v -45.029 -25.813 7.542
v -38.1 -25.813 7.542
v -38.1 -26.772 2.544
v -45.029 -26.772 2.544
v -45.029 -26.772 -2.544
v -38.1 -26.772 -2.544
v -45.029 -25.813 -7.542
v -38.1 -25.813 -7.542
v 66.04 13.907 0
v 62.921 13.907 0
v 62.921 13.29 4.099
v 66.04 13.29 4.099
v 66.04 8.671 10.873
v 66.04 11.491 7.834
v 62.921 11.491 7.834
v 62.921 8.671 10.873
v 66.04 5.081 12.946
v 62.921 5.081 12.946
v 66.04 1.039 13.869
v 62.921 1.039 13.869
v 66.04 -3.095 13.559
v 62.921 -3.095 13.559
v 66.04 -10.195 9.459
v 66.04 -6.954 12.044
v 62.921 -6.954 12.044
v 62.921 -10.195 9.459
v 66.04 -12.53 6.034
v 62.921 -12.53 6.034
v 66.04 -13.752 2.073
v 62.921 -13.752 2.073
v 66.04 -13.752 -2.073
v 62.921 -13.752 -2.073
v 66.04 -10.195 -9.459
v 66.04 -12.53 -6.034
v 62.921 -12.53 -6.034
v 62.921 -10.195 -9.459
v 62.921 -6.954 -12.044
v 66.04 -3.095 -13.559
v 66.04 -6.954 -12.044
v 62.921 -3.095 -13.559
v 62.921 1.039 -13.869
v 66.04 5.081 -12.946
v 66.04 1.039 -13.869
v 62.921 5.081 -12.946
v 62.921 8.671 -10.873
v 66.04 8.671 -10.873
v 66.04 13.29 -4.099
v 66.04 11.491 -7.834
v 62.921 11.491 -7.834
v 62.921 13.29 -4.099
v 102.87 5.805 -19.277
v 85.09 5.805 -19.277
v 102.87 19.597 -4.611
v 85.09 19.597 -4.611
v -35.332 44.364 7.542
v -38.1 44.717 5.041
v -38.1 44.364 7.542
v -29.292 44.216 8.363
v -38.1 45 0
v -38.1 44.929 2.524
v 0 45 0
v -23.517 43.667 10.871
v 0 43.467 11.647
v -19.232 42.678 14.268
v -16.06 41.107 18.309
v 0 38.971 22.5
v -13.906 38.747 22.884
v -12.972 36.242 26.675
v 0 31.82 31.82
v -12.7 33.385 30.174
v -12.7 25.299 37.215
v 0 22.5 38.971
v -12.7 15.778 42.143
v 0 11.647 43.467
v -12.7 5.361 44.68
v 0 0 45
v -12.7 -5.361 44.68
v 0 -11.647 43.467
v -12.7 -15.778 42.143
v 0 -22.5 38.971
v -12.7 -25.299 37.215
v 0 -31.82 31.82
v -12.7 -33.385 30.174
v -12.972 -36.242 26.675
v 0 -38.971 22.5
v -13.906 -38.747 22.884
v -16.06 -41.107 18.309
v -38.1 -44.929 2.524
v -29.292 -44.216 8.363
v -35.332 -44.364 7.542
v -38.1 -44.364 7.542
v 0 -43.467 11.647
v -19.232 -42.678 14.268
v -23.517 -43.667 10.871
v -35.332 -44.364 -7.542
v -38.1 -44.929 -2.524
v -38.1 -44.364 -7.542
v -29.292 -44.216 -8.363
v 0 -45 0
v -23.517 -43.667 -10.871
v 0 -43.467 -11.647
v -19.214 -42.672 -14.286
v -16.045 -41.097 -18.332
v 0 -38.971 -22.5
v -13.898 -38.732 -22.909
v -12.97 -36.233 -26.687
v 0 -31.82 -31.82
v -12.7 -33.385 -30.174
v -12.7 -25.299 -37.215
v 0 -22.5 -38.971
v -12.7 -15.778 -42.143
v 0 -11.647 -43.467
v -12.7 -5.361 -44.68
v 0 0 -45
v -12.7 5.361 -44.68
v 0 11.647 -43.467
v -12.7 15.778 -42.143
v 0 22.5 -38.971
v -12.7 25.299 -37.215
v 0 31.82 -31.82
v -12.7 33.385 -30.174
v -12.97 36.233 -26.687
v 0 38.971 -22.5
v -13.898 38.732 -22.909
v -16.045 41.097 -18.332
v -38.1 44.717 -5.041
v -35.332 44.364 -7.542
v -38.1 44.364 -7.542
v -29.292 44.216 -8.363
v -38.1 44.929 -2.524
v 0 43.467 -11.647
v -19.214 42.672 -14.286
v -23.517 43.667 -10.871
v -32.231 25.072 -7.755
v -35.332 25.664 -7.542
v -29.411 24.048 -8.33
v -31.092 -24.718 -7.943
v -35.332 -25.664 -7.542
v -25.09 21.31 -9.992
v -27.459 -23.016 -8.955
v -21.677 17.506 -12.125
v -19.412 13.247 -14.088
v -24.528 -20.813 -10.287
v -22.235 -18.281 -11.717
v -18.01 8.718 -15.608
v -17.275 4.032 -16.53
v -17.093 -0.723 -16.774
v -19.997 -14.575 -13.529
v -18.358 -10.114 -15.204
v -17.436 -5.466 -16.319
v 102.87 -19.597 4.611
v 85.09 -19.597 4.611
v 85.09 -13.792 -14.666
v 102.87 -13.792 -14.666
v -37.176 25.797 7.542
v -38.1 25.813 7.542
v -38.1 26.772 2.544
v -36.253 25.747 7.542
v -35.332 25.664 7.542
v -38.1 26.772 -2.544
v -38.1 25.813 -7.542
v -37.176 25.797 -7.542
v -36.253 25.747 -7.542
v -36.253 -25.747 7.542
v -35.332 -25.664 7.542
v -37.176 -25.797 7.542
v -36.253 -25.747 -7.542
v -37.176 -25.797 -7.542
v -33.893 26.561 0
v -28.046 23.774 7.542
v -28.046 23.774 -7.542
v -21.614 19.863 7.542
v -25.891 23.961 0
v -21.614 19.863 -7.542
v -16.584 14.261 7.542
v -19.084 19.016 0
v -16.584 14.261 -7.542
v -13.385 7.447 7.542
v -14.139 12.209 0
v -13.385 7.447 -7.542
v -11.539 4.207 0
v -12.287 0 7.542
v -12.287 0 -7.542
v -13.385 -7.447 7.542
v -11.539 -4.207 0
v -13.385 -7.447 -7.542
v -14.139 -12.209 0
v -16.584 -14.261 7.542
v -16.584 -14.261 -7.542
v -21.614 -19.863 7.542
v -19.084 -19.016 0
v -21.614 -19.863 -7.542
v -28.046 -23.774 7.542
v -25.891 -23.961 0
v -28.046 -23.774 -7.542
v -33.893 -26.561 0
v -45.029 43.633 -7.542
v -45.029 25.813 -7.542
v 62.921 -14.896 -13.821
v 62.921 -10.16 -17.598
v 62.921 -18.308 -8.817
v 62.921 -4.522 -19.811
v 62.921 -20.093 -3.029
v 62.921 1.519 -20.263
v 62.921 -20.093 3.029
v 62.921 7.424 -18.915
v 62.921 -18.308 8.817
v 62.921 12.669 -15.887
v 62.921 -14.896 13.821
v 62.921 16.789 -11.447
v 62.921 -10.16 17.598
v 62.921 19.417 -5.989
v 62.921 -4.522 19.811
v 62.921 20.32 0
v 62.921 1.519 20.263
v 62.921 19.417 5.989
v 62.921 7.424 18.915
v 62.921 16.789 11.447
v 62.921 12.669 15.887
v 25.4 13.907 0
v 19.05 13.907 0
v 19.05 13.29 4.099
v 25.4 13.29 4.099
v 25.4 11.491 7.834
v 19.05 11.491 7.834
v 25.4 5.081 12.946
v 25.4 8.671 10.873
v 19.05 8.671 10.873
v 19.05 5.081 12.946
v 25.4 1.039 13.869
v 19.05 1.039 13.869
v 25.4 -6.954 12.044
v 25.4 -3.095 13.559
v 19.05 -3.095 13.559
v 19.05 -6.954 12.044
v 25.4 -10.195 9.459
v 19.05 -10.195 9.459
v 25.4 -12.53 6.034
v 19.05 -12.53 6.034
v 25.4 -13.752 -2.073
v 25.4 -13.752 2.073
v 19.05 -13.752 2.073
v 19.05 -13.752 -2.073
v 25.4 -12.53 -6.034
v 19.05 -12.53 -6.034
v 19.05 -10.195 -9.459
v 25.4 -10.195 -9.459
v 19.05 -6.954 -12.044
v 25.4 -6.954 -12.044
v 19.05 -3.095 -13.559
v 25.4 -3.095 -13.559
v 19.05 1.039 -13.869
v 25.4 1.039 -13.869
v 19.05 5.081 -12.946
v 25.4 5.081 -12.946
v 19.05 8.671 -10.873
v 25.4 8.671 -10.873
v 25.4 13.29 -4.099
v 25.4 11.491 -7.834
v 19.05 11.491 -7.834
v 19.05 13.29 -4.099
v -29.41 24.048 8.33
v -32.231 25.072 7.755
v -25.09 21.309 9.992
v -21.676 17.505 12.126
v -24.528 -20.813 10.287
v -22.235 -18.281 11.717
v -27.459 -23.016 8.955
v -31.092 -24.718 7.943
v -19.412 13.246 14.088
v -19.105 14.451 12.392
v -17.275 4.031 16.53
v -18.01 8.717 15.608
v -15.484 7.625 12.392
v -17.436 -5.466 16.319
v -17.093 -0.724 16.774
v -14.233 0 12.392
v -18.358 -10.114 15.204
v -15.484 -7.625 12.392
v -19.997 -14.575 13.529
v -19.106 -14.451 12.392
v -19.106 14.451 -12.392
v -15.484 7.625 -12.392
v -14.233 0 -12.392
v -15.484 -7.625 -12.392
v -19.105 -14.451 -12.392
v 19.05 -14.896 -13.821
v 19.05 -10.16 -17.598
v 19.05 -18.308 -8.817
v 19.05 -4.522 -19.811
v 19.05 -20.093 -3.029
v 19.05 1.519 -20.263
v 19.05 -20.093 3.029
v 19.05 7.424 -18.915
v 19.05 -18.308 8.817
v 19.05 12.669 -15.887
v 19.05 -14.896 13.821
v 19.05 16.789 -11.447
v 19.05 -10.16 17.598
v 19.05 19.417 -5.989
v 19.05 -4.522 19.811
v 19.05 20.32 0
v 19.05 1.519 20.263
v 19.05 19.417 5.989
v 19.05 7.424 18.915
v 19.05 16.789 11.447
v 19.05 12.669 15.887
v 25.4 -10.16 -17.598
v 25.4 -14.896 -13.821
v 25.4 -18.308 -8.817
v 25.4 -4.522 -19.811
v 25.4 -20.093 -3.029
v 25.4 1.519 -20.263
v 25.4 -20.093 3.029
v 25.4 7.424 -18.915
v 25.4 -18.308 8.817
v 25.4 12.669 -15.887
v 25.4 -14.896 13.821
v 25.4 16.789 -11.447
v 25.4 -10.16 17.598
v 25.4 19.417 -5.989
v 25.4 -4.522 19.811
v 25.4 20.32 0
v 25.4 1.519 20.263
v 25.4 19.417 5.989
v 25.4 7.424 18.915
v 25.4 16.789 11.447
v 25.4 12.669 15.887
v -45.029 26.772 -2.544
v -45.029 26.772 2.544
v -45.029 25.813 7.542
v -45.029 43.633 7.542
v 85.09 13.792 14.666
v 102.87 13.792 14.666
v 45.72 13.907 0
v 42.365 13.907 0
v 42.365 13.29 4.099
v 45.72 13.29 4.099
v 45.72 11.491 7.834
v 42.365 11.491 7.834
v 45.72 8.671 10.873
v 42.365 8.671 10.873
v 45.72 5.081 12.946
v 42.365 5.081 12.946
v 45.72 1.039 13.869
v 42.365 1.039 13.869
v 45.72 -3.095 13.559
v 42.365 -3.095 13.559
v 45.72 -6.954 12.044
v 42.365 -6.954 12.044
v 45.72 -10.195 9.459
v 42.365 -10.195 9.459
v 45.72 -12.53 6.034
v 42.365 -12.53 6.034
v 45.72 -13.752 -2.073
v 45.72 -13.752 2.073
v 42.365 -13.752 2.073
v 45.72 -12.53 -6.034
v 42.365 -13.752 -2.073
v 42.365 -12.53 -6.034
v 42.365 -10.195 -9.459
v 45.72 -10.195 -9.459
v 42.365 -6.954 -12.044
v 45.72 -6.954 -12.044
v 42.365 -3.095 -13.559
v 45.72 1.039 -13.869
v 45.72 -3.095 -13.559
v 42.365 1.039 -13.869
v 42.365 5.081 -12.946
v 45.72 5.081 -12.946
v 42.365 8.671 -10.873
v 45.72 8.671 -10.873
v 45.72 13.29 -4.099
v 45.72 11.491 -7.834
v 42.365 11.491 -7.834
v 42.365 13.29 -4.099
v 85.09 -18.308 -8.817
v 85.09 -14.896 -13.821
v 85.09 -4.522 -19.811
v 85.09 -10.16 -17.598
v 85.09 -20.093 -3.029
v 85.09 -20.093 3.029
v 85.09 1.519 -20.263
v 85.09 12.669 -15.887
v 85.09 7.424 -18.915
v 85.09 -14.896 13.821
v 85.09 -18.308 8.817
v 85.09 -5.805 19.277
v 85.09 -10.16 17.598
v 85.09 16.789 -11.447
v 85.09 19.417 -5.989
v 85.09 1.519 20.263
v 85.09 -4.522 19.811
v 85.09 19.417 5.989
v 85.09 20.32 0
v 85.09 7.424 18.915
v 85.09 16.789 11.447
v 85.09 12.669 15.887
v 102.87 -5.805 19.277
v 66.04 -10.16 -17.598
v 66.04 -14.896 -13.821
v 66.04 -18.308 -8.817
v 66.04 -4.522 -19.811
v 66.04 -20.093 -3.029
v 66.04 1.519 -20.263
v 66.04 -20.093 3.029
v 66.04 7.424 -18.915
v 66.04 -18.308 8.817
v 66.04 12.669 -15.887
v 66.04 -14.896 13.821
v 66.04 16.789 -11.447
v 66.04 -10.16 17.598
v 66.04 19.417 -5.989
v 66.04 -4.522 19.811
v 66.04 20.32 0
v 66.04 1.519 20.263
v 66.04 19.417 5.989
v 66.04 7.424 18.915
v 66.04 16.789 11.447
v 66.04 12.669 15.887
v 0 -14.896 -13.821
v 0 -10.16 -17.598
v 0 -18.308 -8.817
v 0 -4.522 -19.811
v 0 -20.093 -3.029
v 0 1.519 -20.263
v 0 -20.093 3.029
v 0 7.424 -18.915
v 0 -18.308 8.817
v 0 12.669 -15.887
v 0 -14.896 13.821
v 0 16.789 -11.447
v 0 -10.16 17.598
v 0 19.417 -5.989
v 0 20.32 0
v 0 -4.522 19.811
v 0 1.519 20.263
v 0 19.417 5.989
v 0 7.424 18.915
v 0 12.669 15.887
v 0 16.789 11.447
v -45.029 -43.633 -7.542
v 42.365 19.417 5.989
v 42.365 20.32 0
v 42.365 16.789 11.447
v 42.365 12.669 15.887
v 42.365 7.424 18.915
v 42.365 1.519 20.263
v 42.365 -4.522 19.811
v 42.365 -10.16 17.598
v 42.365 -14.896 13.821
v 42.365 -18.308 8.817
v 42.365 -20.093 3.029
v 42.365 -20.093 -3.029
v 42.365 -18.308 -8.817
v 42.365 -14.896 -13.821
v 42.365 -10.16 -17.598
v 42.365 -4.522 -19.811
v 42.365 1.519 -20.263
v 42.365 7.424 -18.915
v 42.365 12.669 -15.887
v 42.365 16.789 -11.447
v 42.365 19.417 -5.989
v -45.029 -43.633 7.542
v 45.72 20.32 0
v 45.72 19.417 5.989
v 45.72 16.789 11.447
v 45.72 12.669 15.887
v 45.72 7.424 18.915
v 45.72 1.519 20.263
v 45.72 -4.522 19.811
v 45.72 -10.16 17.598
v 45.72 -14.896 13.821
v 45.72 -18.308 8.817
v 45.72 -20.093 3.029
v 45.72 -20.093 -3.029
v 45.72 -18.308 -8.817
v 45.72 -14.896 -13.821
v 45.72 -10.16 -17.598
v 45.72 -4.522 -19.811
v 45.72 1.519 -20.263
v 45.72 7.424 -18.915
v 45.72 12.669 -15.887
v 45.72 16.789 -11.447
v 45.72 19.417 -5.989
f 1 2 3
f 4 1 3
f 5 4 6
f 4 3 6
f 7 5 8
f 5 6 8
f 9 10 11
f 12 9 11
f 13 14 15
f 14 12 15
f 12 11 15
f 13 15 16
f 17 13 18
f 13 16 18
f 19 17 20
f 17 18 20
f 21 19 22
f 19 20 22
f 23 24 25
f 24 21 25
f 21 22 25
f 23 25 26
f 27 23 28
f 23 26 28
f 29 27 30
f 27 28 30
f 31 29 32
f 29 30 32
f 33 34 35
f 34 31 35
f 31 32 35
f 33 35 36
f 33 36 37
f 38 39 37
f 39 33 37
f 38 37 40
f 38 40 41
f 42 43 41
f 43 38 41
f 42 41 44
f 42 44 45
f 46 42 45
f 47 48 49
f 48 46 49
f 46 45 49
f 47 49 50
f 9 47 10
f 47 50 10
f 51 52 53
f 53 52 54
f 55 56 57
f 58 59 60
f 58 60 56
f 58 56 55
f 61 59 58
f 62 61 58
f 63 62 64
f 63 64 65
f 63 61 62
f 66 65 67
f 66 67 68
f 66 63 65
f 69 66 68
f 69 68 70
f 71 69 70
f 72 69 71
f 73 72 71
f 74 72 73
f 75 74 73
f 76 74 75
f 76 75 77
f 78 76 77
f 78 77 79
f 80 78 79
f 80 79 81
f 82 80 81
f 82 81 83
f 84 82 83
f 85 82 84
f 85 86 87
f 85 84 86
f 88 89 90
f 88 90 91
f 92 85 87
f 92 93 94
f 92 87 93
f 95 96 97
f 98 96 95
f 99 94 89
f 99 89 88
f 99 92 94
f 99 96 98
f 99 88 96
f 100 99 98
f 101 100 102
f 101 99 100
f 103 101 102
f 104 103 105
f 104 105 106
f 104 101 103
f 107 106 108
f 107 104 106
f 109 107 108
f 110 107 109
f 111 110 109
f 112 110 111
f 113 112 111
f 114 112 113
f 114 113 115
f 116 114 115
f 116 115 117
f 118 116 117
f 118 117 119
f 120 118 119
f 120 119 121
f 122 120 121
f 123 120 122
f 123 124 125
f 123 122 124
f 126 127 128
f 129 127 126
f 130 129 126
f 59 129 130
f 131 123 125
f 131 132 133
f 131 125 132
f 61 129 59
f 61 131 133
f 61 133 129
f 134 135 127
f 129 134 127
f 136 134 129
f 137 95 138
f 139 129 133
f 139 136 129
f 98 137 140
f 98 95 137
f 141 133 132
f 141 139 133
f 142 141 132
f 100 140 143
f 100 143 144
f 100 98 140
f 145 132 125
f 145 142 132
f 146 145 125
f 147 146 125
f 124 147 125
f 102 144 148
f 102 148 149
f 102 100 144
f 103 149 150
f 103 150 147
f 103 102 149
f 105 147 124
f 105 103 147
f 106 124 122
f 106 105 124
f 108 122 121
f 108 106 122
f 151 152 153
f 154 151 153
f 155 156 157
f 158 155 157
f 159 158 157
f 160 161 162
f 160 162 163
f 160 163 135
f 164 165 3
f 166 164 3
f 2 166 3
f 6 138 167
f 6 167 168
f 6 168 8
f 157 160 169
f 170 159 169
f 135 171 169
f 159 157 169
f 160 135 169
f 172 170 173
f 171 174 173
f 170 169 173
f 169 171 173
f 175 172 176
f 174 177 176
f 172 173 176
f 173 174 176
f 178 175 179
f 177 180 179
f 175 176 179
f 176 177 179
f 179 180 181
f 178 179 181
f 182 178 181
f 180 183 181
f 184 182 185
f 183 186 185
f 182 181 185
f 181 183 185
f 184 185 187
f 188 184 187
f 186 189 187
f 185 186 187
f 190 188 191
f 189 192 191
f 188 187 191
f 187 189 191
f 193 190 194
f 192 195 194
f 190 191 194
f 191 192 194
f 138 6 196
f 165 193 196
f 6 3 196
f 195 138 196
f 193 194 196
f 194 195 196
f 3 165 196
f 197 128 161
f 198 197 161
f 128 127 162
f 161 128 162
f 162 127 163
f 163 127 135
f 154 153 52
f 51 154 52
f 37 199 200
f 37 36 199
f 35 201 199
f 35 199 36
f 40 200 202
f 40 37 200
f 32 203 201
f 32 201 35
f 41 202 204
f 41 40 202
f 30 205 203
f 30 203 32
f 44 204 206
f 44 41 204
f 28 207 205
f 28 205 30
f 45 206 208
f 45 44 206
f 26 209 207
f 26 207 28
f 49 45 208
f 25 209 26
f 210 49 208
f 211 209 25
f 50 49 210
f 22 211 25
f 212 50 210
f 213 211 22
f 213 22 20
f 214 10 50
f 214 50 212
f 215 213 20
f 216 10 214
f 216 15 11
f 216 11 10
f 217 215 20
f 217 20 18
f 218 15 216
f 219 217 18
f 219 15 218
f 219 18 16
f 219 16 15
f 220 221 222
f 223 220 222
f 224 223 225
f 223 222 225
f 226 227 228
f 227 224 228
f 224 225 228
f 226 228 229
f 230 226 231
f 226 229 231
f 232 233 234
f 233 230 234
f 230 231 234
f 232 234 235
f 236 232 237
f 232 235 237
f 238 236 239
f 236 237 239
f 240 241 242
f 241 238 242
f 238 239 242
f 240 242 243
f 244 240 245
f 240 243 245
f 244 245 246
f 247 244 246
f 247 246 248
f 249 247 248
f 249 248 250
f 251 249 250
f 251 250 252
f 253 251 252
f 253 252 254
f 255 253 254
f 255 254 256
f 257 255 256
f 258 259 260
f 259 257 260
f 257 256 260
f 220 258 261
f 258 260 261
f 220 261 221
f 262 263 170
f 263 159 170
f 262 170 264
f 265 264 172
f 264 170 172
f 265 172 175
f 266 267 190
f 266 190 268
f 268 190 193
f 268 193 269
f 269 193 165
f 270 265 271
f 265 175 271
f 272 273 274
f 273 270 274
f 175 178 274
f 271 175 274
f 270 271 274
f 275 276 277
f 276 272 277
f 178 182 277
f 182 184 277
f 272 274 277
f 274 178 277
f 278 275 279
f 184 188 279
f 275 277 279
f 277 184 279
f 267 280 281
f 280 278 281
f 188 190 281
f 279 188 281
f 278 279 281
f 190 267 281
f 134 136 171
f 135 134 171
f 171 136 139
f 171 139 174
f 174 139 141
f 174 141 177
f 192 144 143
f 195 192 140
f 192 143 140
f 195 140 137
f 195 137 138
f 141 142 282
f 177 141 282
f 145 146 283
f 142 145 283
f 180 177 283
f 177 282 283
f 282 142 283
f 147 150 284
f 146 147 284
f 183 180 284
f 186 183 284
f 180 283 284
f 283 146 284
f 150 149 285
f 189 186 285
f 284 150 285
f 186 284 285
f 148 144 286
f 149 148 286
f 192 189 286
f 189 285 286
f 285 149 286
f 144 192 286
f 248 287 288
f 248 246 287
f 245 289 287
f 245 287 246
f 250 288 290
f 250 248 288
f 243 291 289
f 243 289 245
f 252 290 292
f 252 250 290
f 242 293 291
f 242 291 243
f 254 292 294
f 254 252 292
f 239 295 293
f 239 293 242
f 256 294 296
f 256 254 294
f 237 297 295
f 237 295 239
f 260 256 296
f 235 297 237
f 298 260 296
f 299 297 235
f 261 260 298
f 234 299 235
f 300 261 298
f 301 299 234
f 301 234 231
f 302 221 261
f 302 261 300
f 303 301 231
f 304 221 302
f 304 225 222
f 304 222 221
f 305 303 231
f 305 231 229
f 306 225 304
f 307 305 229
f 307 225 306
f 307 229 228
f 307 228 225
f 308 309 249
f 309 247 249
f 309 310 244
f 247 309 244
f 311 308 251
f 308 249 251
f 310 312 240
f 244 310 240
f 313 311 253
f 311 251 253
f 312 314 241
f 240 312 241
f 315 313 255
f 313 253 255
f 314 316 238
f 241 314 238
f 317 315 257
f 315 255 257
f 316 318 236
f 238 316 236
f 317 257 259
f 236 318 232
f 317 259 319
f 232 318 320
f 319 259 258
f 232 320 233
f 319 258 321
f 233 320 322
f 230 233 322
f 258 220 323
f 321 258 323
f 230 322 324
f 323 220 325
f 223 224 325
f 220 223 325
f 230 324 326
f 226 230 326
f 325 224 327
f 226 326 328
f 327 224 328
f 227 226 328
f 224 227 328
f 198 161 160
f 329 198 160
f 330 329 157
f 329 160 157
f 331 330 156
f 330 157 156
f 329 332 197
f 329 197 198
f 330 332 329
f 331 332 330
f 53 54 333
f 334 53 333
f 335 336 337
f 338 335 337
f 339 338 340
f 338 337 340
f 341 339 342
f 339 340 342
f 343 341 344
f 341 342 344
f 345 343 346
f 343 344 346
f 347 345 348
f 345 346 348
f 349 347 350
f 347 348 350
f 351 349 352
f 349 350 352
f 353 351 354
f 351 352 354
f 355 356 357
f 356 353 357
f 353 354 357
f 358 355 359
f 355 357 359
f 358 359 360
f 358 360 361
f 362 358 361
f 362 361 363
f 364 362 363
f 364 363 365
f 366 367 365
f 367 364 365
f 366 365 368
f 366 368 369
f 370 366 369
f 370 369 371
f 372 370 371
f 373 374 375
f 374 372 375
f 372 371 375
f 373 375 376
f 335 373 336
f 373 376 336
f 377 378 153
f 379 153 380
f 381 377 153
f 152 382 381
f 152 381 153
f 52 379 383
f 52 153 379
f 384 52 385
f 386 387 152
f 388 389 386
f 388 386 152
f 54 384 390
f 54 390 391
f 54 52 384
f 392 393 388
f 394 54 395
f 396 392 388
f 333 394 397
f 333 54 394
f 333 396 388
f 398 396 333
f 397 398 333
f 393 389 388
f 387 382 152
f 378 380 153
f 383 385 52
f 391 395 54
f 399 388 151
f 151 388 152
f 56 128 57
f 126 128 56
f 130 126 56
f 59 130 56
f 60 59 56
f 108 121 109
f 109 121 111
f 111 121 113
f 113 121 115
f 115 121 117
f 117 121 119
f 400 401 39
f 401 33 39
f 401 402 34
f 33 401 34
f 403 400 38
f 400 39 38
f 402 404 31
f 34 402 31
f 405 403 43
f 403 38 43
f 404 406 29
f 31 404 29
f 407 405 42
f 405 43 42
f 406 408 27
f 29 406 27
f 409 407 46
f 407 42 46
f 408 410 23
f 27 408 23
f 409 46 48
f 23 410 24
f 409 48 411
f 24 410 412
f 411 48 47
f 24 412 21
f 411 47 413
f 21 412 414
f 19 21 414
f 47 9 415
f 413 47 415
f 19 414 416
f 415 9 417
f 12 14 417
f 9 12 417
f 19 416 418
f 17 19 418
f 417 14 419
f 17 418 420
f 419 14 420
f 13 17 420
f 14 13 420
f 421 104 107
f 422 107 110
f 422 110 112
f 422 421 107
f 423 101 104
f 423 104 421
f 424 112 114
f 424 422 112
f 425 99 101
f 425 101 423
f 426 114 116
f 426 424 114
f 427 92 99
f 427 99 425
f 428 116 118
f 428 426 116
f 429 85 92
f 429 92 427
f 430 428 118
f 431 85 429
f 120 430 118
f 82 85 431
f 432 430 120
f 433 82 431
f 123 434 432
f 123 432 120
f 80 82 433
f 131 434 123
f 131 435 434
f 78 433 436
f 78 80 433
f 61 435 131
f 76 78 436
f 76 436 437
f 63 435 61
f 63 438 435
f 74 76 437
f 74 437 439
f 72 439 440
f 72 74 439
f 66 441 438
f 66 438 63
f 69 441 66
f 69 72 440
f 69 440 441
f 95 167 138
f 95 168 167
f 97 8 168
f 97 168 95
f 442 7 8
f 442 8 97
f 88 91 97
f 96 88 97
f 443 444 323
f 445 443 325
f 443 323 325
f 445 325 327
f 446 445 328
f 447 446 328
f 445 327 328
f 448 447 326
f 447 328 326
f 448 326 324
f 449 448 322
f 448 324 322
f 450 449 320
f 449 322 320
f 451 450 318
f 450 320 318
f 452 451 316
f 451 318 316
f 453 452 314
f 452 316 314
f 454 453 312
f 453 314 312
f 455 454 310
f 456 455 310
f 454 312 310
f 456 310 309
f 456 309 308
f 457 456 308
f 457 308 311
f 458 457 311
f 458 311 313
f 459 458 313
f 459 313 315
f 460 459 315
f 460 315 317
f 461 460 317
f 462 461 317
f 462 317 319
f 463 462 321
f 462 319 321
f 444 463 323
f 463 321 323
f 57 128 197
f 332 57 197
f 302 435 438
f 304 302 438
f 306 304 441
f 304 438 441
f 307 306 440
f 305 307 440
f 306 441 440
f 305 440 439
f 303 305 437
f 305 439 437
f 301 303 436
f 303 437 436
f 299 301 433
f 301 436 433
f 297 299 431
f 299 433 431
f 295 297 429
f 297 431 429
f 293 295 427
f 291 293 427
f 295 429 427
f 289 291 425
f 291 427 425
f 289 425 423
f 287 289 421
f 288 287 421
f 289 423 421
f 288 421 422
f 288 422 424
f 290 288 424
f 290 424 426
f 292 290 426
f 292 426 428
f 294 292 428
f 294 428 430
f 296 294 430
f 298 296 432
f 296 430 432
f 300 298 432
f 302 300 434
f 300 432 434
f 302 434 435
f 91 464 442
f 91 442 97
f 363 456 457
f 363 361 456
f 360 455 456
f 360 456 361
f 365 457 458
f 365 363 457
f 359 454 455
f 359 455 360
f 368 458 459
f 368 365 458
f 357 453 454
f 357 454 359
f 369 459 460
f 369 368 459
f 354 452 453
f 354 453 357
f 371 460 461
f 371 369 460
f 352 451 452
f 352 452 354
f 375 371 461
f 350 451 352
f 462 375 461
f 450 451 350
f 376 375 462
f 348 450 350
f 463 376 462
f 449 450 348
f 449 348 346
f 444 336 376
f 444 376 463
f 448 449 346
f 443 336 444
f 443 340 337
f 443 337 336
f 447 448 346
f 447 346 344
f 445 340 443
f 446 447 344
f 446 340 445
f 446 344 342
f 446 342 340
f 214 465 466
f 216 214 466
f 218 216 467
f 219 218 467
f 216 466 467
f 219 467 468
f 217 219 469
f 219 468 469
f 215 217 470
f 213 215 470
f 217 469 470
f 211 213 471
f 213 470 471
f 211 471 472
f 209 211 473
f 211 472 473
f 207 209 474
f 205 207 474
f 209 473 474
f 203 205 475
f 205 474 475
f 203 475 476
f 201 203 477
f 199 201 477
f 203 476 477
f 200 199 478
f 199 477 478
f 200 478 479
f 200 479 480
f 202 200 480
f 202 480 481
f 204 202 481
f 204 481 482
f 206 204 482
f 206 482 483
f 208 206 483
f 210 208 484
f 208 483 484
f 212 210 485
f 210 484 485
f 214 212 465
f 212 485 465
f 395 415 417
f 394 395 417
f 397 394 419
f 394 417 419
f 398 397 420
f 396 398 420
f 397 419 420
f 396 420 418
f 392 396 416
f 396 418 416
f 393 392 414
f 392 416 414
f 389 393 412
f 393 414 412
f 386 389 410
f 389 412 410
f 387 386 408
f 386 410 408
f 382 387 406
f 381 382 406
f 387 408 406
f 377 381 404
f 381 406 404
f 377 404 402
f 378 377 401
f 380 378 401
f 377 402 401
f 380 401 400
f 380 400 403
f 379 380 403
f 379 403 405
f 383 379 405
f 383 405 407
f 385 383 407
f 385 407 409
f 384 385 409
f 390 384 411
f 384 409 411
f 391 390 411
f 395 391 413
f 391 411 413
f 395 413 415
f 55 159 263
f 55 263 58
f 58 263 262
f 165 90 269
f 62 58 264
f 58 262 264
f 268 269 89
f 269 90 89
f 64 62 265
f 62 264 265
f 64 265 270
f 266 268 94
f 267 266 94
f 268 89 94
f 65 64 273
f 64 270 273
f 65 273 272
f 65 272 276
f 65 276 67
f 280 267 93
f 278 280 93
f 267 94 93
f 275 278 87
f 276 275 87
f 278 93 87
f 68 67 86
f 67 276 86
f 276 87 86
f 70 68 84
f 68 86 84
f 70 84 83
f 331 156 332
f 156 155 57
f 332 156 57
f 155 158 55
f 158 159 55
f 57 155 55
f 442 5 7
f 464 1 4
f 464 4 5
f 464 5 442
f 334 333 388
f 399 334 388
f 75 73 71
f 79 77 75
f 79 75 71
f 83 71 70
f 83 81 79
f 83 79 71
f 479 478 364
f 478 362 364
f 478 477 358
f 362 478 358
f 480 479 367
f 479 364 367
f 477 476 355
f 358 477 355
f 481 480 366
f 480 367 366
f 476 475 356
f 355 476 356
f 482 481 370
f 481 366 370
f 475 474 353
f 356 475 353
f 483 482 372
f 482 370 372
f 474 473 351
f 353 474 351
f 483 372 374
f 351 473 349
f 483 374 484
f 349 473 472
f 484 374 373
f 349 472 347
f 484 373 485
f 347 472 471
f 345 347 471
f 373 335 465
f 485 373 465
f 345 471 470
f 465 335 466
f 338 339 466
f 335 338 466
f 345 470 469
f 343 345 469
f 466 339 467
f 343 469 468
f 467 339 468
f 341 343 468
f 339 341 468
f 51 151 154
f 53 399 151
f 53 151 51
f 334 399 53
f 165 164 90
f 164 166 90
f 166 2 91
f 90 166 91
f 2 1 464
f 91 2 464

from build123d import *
from build123d import SkipClean  # not in build123d's __all__

# Parameters (mm, degrees)
F0_R      = 45
F1_DEPTH  = 38.1
F2_R      = 13.9074924411
F3_DEPTH  = 92.41422
F7_R      = 20.32
F8_DEPTH  = 19.05
F9_R      = 20.32
F10_DEPTH = 16.96493
F11_R     = 20.32
F12_DEPTH = 17.20109
F13_R     = 20.32
F14_DEPTH = 19.05
F16_DEPTH = 17.78
F17_W     = 88.86107839
F17_H     = 39.3804269531
F18_DEPTH = 25.4
F19_R     = 22.6323588882
F23_DEPTH = 6.92853
F24_W     = 6.92853
F24_H     = 2.8661746596
F25_DEPTH = 25.4


with BuildPart() as f1:
    # F0 (on Right) → F1 (new body)
    with BuildSketch(Plane.YZ):
        Circle(F0_R)
    extrude(amount=-F1_DEPTH)

    # F2 (on face) → F3 (join)
    with BuildSketch(Plane.YZ):
        Circle(F2_R)
    extrude(amount=F3_DEPTH)

    # F7 (on Right) → F8 (join)
    with BuildSketch(Plane.YZ):
        Circle(F7_R)
    extrude(amount=F8_DEPTH)

    # F9 (on offset) → F10 (join)
    with BuildSketch(Plane.YZ.offset(25.4)):
        Circle(F9_R)
    extrude(amount=F10_DEPTH)

    # F11 (on offset) → F12 (join)
    with BuildSketch(Plane.YZ.offset(45.72)):
        Circle(F11_R)
    extrude(amount=F12_DEPTH)

    # F13 (on offset) → F14 (join)
    with BuildSketch(Plane.YZ.offset(66.04)):
        Circle(F13_R)
    extrude(amount=F14_DEPTH)

    # F15 (on face) → F16 (join)
    with BuildSketch(Plane.YZ.offset(85.09)):
        Polygon((13.7920507069, 14.6662479487), (-5.8053179483, 19.2773902568), (-19.5973686552, 4.6111423081), (-13.7920507069, -14.6662479487), (5.8053179483, -19.2773902568), (19.5973686552, -4.6111423081), align=None)
    extrude(amount=F16_DEPTH)

    # F17 (on face) → F18 (cut)
    with BuildSketch(Plane(origin=(-38.1, 0, 0), x_dir=(0, -1, 0), z_dir=(-1, 0, 0))):
        with Locations((0.0670028883, 27.2318741928)):
            Rectangle(F17_W, F17_H)
        with Locations((0.0670028883, -27.2318741928)):
            Rectangle(F17_W, F17_H)
    extrude(amount=-F18_DEPTH, mode=Mode.SUBTRACT)

    # F19
    f19_edges = [f1.edges().sort_by_distance(p)[0] for p in [
        (-12.7, 0, 7.541661),
        (-12.7, 0, -7.541661),
    ]]
    fillet(f19_edges, radius=F19_R)

    # F20 (on face) → F21 (revolve, cut)
    with BuildSketch(Plane(origin=(-38.1, 0, 0), x_dir=(0, -1, 0), z_dir=(-1, 0, 0))):
        with BuildLine():
            Line((0, -7.5416607163), (0, 0))
            Line((0, 0), (0, 7.5416607163))
            Line((0, 7.5416607163), (-25.8131183102, 7.5416607163))
            ThreePointArc((-25.8131183102, 7.5416607163), (-26.8922614009, 0), (-25.8131183102, -7.5416607163))
            Line((-25.8131183102, -7.5416607163), (0, -7.5416607163))
        make_face()
        with BuildLine():
            Line((-25.8131183102, 7.5416607163), (0, 7.5416607163))
            Line((0, 7.5416607163), (0, 26.8922614009))
            ThreePointArc((0, 26.8922614009), (-16.1304279527, 21.5175049045), (-25.8131183102, 7.5416607163))
        make_face()
        with BuildLine():
            Line((0, -26.8922614009), (0, -7.5416607163))
            Line((0, -7.5416607163), (-25.8131183102, -7.5416607163))
            ThreePointArc((-25.8131183102, -7.5416607163), (-16.1304279527, -21.5175049045), (0, -26.8922614009))
        make_face()
    revolve(axis=Axis((-38.1, 0, 10.4196144343), (0, 0, -1)), mode=Mode.SUBTRACT)

    # F22 (on face) → F23 (join)
    with BuildSketch(Plane(origin=(-38.1, 0, 0), x_dir=(0, -1, 0), z_dir=(-1, 0, 0))):
        with BuildLine():
            Line((-25.8131183102, 7.5416607163), (-44.3635363068, 7.5416607163))
            ThreePointArc((-44.3635363068, 7.5416607163), (-45, 0), (-44.3635363068, -7.5416607163))
            Line((-44.3635363068, -7.5416607163), (-25.8131183102, -7.5416607163))
            ThreePointArc((-25.8131183102, -7.5416607163), (-26.8922614009, 0), (-25.8131183102, 7.5416607163))
        make_face()
        with BuildLine():
            ThreePointArc((25.8131183102, 7.5416607163), (26.8922614009, 0), (25.8131183102, -7.5416607163))
            Line((25.8131183102, -7.5416607163), (44.3635363068, -7.5416607163))
            ThreePointArc((44.3635363068, -7.5416607163), (45, 0), (44.3635363068, 7.5416607163))
            Line((44.3635363068, 7.5416607163), (25.8131183102, 7.5416607163))
        make_face()
    with SkipClean():  # cleaning this boolean's faces spoils the solid; the shape is the same uncleaned
        extrude(amount=F23_DEPTH)

    # F24 (on face) → F25 (cut)
    with BuildSketch(Plane(origin=(0, 0, -7.5416607163), x_dir=(1, 0, 0), z_dir=(0, 0, -1))):
        Polygon((-45.02853, 43.6333455145), (-38.1, 44.3635363068), (-38.1, 47.2297109663), (-45.02853, 47.2297109663), (-45.02853, 44.3635363068), align=None)
        Polygon((-45.02853, -44.3635363068), (-38.1, -44.3635363068), (-45.02853, -43.6333455145), align=None)
        with Locations((-41.564265, -45.7966236366)):
            Rectangle(F24_W, F24_H)
    extrude(amount=-F25_DEPTH, mode=Mode.SUBTRACT)


solid = f1.part
